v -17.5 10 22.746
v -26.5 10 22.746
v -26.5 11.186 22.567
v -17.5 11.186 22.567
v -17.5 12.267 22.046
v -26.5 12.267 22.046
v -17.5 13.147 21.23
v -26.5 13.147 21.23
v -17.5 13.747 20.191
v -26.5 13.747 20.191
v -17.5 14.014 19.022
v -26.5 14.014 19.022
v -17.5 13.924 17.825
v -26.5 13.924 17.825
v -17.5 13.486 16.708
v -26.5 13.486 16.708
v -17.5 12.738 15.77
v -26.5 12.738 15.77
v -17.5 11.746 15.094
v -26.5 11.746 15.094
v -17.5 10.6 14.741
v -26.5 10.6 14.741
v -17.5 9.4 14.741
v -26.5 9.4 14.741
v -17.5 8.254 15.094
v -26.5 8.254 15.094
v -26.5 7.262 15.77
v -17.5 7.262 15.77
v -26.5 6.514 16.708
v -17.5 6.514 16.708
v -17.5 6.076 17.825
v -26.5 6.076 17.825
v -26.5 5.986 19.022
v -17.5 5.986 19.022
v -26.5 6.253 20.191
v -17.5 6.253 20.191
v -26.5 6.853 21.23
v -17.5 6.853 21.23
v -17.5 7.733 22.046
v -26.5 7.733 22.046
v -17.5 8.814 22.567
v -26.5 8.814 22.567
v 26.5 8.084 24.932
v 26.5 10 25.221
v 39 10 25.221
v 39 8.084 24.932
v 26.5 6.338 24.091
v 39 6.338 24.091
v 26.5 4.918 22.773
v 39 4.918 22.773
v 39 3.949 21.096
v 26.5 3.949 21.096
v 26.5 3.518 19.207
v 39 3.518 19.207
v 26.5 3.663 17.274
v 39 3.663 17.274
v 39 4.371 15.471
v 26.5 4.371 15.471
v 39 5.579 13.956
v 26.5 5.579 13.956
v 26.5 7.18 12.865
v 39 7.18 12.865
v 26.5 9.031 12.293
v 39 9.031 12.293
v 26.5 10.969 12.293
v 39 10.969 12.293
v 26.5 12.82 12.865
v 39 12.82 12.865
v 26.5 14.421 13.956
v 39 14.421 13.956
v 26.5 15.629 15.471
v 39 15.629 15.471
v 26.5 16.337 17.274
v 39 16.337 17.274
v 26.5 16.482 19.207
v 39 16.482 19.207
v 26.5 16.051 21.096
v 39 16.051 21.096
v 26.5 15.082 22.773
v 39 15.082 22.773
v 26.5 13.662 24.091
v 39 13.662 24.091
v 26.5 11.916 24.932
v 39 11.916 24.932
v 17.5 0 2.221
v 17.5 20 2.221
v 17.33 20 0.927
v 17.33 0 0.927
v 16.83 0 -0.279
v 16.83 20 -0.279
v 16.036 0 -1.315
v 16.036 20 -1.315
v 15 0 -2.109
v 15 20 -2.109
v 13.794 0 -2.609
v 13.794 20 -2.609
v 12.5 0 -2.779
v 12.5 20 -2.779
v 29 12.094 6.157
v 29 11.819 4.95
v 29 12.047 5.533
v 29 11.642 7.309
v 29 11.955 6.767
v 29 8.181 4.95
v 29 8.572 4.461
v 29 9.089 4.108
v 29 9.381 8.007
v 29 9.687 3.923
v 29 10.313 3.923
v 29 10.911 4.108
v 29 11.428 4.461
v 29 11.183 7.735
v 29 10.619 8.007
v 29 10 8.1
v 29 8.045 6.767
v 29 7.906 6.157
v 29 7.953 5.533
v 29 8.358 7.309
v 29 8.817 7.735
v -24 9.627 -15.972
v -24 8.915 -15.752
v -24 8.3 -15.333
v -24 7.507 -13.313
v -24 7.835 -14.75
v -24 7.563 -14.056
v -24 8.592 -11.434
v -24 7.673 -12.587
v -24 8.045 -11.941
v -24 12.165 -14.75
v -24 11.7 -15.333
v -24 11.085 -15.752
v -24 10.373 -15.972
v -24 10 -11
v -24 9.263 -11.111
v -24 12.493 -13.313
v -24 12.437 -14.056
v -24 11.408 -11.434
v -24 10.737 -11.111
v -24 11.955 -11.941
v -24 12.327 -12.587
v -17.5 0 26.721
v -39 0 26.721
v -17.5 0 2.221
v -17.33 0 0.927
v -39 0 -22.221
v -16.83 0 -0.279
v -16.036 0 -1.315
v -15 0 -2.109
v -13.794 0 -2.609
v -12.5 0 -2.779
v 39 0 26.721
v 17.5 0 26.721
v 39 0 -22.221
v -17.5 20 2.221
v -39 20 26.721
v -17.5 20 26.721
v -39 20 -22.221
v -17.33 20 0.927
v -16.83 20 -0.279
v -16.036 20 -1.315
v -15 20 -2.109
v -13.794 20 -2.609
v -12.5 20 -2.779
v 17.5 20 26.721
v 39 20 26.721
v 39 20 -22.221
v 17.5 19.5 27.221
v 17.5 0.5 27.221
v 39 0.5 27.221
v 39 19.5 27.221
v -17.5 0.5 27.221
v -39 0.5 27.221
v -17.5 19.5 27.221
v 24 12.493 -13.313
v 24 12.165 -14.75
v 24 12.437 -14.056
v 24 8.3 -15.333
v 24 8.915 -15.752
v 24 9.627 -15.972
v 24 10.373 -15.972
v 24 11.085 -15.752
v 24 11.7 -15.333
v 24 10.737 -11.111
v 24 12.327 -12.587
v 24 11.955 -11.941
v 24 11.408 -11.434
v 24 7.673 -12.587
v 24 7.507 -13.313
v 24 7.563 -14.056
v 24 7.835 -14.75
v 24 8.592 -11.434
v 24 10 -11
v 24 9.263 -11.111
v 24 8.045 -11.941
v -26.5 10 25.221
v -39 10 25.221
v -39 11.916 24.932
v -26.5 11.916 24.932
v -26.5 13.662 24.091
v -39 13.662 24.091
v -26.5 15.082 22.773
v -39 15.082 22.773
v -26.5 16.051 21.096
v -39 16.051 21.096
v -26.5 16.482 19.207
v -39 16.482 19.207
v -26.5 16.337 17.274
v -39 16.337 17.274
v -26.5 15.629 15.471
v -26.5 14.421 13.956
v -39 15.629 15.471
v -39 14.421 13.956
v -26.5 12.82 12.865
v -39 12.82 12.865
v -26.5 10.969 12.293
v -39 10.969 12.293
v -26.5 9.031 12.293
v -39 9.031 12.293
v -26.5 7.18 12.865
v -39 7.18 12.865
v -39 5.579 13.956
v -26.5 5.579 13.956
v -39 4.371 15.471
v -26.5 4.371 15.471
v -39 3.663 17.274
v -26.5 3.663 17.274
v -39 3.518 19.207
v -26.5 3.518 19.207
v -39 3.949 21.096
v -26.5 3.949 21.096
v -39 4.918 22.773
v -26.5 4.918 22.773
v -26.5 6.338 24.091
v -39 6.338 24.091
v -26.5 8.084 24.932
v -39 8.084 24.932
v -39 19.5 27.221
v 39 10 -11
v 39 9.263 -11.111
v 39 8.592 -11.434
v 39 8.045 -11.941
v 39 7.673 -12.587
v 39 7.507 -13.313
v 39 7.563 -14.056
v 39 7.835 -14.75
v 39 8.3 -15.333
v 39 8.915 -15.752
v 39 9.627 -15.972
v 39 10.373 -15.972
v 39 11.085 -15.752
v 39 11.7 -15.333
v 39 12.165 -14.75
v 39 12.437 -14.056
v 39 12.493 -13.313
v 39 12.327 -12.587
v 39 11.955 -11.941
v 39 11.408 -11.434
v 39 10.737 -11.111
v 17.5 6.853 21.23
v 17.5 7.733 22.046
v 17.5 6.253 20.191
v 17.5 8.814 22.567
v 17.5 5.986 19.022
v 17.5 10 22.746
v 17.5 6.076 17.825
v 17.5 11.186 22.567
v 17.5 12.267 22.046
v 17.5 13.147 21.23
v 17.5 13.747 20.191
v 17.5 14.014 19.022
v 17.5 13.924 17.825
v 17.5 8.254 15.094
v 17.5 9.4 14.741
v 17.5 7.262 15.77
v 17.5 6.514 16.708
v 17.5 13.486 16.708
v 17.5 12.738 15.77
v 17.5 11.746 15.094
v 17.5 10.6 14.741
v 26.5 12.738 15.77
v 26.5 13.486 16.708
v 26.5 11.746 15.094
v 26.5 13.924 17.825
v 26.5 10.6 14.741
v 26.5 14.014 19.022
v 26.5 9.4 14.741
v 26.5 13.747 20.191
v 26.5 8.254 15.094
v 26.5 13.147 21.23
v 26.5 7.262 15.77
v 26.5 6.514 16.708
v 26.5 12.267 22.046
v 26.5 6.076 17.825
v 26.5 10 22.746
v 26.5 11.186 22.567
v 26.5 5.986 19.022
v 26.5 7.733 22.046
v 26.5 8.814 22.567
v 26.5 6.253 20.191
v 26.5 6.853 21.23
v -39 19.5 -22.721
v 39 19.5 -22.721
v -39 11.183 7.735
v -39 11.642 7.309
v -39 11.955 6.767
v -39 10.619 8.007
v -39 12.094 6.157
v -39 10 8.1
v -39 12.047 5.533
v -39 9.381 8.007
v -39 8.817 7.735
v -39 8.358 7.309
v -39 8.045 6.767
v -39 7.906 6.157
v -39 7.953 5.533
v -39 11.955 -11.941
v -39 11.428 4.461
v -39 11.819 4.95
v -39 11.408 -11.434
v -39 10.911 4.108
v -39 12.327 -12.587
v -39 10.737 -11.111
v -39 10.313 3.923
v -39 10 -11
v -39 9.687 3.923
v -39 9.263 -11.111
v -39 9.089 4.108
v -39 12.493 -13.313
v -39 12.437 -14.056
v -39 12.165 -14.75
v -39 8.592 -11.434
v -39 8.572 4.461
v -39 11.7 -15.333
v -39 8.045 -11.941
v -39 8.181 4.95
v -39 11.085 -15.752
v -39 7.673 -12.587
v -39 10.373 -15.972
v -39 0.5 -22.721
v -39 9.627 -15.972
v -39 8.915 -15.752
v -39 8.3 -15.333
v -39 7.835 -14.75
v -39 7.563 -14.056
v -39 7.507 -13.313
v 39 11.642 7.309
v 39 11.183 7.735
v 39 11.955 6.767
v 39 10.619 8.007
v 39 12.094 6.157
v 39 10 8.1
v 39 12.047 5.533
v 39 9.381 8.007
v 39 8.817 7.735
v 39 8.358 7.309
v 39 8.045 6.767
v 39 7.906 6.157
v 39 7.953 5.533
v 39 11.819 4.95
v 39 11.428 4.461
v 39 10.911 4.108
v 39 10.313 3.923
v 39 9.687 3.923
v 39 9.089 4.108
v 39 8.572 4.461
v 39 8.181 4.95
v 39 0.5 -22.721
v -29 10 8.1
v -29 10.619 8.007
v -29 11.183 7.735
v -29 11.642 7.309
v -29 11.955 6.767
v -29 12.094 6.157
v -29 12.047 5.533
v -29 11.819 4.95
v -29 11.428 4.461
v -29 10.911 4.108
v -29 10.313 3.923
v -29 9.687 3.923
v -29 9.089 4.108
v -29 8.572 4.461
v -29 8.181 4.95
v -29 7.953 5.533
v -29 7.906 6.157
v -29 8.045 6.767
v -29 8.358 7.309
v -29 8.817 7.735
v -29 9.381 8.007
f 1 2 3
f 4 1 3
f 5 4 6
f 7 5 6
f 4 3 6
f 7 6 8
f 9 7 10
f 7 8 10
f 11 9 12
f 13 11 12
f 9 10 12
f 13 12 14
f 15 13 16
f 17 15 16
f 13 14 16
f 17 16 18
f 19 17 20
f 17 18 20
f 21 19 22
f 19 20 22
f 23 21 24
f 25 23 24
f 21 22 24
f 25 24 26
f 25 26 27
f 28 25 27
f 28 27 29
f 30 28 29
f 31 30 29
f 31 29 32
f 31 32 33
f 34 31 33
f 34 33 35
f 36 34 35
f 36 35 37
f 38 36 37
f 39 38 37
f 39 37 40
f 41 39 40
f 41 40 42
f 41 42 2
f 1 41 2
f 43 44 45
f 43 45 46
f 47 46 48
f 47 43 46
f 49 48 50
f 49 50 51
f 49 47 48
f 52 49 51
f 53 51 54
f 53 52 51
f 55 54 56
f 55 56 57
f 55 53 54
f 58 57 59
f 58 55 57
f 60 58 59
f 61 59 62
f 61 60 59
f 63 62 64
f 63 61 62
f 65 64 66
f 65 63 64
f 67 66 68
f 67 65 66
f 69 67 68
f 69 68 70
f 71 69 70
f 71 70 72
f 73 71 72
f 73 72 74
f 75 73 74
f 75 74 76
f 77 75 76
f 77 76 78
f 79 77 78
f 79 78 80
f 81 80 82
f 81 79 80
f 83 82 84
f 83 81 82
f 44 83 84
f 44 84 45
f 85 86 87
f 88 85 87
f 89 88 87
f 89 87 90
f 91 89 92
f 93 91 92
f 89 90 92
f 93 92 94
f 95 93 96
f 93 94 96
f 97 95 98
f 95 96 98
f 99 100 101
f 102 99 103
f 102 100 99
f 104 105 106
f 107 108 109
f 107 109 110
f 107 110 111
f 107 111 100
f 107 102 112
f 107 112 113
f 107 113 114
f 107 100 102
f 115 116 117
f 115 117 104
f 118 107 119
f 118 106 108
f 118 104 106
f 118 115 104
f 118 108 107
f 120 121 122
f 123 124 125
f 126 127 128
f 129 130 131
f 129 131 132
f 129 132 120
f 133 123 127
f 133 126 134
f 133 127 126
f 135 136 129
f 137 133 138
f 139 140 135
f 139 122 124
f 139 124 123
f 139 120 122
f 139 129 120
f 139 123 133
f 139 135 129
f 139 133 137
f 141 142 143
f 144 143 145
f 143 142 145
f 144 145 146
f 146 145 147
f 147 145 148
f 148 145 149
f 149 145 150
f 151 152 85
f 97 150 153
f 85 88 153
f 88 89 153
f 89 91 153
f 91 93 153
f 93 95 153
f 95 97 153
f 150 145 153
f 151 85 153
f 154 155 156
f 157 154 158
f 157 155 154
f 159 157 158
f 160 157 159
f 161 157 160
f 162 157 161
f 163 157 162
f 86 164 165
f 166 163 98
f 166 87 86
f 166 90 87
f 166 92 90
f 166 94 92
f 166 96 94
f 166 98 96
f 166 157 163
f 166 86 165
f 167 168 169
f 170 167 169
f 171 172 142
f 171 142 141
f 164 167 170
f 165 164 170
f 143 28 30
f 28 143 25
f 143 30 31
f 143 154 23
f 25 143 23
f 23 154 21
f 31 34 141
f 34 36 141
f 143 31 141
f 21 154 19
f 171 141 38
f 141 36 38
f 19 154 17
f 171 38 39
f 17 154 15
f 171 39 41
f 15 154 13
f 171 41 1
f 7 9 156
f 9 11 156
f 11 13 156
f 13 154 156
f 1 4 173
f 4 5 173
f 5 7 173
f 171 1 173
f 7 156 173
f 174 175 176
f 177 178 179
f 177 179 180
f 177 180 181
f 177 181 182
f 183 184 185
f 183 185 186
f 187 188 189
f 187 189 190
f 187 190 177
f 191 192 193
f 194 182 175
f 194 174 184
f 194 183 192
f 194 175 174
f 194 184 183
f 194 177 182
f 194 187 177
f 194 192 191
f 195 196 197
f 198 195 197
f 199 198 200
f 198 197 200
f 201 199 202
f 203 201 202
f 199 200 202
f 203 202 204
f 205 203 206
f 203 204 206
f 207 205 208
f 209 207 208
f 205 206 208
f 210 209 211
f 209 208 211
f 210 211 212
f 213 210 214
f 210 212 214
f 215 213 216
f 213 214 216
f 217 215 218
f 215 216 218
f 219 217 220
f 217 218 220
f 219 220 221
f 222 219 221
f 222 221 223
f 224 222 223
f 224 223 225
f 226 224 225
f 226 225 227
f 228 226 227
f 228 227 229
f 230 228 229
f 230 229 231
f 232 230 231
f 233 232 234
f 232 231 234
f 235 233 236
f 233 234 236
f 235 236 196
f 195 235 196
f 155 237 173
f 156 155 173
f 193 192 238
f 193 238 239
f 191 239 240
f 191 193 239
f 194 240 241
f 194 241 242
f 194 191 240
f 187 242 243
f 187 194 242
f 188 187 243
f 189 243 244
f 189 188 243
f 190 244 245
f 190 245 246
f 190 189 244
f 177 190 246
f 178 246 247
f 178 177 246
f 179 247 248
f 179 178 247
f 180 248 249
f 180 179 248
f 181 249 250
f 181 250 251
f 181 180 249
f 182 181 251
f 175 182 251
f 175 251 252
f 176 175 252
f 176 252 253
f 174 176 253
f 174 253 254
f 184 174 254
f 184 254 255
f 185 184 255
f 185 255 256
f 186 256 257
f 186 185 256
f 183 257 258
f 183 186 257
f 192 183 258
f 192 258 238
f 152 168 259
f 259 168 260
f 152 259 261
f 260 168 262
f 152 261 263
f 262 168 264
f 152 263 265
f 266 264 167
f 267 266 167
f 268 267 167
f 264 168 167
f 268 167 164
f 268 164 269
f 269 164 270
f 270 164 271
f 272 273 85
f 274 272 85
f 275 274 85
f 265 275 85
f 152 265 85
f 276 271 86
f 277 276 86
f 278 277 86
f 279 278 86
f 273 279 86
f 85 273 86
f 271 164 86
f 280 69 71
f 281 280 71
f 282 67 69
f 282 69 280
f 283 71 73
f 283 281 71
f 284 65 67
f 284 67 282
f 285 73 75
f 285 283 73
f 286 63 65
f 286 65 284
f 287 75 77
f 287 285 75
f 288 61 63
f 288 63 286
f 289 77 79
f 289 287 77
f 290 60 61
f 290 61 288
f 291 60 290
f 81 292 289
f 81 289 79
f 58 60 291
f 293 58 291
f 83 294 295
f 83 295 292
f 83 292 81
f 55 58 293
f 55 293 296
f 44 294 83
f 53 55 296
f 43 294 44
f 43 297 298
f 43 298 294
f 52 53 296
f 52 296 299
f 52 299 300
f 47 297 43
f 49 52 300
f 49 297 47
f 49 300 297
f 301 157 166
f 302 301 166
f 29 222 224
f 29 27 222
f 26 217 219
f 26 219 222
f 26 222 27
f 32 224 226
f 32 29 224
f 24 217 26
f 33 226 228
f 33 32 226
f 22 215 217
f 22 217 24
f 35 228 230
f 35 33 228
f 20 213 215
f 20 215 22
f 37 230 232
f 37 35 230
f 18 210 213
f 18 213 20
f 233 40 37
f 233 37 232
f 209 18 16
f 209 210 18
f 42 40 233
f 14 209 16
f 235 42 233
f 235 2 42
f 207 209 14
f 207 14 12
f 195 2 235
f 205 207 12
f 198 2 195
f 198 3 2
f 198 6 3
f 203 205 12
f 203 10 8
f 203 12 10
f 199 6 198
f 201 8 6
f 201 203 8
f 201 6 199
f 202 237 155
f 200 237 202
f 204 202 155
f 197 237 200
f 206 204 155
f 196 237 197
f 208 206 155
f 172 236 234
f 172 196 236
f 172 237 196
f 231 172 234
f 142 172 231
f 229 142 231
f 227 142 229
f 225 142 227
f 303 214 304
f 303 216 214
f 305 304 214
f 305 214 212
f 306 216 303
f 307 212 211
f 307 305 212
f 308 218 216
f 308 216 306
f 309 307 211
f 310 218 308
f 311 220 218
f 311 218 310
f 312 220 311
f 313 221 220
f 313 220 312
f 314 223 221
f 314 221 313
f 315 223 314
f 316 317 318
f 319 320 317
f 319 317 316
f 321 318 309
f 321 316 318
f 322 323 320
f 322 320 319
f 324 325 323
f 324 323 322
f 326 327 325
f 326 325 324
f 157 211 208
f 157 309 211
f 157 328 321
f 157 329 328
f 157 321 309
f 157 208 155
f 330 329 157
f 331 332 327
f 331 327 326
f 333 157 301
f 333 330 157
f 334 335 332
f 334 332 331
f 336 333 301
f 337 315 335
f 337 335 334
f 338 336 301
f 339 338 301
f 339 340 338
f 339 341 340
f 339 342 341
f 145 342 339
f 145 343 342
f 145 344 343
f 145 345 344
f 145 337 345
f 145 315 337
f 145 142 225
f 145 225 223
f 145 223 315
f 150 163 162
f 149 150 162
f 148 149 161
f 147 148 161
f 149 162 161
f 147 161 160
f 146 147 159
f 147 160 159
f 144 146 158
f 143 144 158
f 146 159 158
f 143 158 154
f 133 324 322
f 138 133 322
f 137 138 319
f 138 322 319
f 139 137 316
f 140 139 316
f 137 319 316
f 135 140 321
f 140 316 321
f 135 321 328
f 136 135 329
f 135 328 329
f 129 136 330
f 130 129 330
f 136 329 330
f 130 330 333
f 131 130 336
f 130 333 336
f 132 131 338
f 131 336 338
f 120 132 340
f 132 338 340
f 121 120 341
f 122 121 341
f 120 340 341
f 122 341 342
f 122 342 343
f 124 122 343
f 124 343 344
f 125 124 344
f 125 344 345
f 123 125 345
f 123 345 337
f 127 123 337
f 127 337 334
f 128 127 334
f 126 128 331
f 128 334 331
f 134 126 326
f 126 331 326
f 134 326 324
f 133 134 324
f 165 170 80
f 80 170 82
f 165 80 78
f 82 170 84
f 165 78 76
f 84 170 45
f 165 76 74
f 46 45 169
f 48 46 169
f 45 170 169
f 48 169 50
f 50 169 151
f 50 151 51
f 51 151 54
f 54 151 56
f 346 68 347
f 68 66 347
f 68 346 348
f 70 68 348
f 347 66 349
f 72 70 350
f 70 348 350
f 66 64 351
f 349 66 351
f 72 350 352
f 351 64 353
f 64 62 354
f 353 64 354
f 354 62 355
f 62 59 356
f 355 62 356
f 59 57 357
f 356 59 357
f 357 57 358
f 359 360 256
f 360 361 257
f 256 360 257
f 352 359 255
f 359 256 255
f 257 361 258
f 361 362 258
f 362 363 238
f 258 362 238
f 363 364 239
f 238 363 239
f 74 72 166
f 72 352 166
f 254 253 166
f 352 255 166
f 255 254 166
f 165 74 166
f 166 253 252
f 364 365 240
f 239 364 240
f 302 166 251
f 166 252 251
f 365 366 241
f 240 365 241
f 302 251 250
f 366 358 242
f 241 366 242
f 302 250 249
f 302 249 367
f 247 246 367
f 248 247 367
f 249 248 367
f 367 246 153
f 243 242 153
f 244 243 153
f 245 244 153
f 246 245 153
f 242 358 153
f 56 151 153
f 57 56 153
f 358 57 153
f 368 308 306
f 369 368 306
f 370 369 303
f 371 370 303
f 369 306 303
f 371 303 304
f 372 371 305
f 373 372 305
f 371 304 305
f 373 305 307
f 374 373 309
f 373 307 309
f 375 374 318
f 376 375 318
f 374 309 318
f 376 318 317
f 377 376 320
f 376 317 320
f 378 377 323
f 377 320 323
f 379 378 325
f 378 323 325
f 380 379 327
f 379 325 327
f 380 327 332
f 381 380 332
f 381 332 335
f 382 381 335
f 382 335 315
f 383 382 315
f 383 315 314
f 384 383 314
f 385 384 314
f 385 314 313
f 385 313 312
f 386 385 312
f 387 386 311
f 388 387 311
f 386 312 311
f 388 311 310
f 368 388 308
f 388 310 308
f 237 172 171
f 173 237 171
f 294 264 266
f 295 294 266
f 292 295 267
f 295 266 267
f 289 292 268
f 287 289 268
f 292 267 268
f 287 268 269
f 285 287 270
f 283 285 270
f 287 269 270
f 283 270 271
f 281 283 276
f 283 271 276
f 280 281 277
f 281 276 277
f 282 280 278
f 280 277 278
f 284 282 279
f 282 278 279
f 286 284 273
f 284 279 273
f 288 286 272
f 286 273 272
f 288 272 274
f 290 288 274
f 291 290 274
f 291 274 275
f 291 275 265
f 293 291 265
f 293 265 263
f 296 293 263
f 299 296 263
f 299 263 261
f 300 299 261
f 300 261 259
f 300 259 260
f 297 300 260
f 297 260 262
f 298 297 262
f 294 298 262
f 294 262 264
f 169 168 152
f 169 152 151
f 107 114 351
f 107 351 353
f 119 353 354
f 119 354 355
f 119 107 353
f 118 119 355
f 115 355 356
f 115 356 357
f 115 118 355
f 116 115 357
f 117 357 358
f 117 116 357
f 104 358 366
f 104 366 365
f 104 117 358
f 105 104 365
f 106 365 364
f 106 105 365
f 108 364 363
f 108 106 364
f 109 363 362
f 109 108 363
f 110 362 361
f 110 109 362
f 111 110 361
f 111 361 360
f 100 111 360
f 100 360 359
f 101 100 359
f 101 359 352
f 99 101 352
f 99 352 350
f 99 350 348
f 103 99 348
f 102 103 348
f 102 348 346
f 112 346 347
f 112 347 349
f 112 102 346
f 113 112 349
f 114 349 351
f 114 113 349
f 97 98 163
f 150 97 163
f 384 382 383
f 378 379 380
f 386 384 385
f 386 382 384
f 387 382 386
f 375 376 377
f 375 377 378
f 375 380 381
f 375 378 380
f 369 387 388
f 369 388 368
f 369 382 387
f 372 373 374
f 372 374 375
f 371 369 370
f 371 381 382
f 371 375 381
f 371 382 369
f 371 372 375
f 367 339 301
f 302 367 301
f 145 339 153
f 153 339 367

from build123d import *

# Parameters (mm, degrees)
SKETCH_1_W           = 78
SKETCH_1_H           = 54.441624366
EXTRUDE_1_DEPTH      = 20
CUT_EXTRUDE_1_DEPTH  = 52.59430798
SKETCH_3_R           = 2.5
CUT_EXTRUDE_2_DEPTH  = 15
SKETCH_4_R           = 2.1
CUT_EXTRUDE_3_DEPTH  = 10
SKETCH_5_R           = 6.5
CUT_EXTRUDE_4_DEPTH  = 12.5
SKETCH_6_R           = 4.025
CUT_EXTRUDE_5_DEPTH  = 74.696829076
CUT_EXTRUDE_START    = -12.5
SKETCH_7_R           = 6.5
CUT_EXTRUDE_6_DEPTH  = 12.5
CUT_EXTRUDE_START_2  = -15
SKETCH_11_R          = 2.5
CUT_EXTRUDE_9_DEPTH  = 15
CUT_EXTRUDE_START_3  = -10
SKETCH_12_R          = 2.1
CUT_EXTRUDE_10_DEPTH = 10
SKETCH_9_W           = 4.5
SKETCH_9_H           = 20
CUT_EXTRUDE_8_DEPTH  = 85.999838917
CHAMFER_3_SIZE       = 0.5


with BuildPart() as part:
    # 草图1 → 凸台-拉伸1 (new body)
    with BuildSketch(Plane(origin=(0, 0, 0), x_dir=(1, 0, 0), z_dir=(0, 1, 0))):
        Rectangle(SKETCH_1_W, SKETCH_1_H)
    extrude(amount=EXTRUDE_1_DEPTH)

    # 草图2 → 切除-拉伸1 (cut, through all)
    with BuildSketch(Plane(origin=(0, 20, 0), x_dir=(1, 0, 0), z_dir=(0, 1, 0))):
        with BuildLine():
            Line((-17.5, -27.220812183), (17.5, -27.220812183))
            Line((17.5, -27.220812183), (17.5, -2.220812183))
            ThreePointArc((17.5, -2.220812183), (16.035533906, 1.314721723), (12.5, 2.779187817))
            Line((12.5, 2.779187817), (-12.5, 2.779187817))
            ThreePointArc((-12.5, 2.779187817), (-16.035533906, 1.314721723), (-17.5, -2.220812183))
            Line((-17.5, -2.220812183), (-17.5, -27.220812183))
        make_face()
    extrude(amount=-CUT_EXTRUDE_1_DEPTH, mode=Mode.SUBTRACT)

    # 草图3 → 切除-拉伸2 (cut)
    with BuildSketch(Plane.ZY.offset(39)):
        with Locations((-13.5, 10)):
            Circle(SKETCH_3_R)
    extrude(amount=-CUT_EXTRUDE_2_DEPTH, mode=Mode.SUBTRACT)

    # 草图4 → 切除-拉伸3 (cut)
    with BuildSketch(Plane.ZY.offset(39)):
        with Locations((6, 10)):
            Circle(SKETCH_4_R)
    extrude(amount=-CUT_EXTRUDE_3_DEPTH, mode=Mode.SUBTRACT)

    # 草图5 → 切除-拉伸4 (cut)
    with BuildSketch(Plane.ZY.offset(39)):
        with Locations((18.720812183, 10)):
            Circle(SKETCH_5_R)
    extrude(amount=-CUT_EXTRUDE_4_DEPTH, mode=Mode.SUBTRACT)

    # 草图6 → 切除-拉伸5 (cut, through all)
    with BuildSketch(Plane.ZY.offset(26.5)):
        with Locations((18.720812183, 10)):
            Circle(SKETCH_6_R)
    extrude(amount=-CUT_EXTRUDE_5_DEPTH, mode=Mode.SUBTRACT)

    # 草图7 → 切除-拉伸6 (cut)
    with BuildSketch(Plane(origin=(39, 0, 0), x_dir=(0, 0, -1), z_dir=(1, 0, 0)).offset(CUT_EXTRUDE_START)):
        with Locations(Location((-18.720812183, 10, 0), (0, 0, 180))):
            Circle(SKETCH_7_R)
    extrude(amount=CUT_EXTRUDE_6_DEPTH, mode=Mode.SUBTRACT)

    # 草图11 → 切除-拉伸9 (cut)
    with BuildSketch(Plane(origin=(39, 0, 0), x_dir=(0, 0, -1), z_dir=(1, 0, 0)).offset(CUT_EXTRUDE_START_2)):
        with Locations(Location((13.5, 10, 0), (0, 0, 180))):
            Circle(SKETCH_11_R)
    extrude(amount=CUT_EXTRUDE_9_DEPTH, mode=Mode.SUBTRACT)

    # 草图12 → 切除-拉伸10 (cut)
    with BuildSketch(Plane(origin=(39, 0, 0), x_dir=(0, 0, -1), z_dir=(1, 0, 0)).offset(CUT_EXTRUDE_START_3)):
        with Locations(Location((-6, 10, 0), (0, 0, 180))):
            Circle(SKETCH_12_R)
    extrude(amount=CUT_EXTRUDE_10_DEPTH, mode=Mode.SUBTRACT)

    # 草图9 → 切除-拉伸8 (cut, through all)
    with BuildSketch(Plane.ZY.offset(39)):
        with Locations((-24.970812183, 10)):
            Rectangle(SKETCH_9_W, SKETCH_9_H)
    extrude(amount=-CUT_EXTRUDE_8_DEPTH, mode=Mode.SUBTRACT)

    # 倒角3
    chamfer_3_edges = [part.edges().sort_by_distance(p)[0] for p in [
        (28.25, 0, 27.220812183),
        (-28.25, 20, 27.220812183),
        (28.25, 20, 27.220812183),
        (-28.25, 0, 27.220812183),
        (0, 20, -22.720812183),
        (0, 0, -22.720812183),
    ]]
    chamfer(chamfer_3_edges, length=CHAMFER_3_SIZE)


solid = part.part
